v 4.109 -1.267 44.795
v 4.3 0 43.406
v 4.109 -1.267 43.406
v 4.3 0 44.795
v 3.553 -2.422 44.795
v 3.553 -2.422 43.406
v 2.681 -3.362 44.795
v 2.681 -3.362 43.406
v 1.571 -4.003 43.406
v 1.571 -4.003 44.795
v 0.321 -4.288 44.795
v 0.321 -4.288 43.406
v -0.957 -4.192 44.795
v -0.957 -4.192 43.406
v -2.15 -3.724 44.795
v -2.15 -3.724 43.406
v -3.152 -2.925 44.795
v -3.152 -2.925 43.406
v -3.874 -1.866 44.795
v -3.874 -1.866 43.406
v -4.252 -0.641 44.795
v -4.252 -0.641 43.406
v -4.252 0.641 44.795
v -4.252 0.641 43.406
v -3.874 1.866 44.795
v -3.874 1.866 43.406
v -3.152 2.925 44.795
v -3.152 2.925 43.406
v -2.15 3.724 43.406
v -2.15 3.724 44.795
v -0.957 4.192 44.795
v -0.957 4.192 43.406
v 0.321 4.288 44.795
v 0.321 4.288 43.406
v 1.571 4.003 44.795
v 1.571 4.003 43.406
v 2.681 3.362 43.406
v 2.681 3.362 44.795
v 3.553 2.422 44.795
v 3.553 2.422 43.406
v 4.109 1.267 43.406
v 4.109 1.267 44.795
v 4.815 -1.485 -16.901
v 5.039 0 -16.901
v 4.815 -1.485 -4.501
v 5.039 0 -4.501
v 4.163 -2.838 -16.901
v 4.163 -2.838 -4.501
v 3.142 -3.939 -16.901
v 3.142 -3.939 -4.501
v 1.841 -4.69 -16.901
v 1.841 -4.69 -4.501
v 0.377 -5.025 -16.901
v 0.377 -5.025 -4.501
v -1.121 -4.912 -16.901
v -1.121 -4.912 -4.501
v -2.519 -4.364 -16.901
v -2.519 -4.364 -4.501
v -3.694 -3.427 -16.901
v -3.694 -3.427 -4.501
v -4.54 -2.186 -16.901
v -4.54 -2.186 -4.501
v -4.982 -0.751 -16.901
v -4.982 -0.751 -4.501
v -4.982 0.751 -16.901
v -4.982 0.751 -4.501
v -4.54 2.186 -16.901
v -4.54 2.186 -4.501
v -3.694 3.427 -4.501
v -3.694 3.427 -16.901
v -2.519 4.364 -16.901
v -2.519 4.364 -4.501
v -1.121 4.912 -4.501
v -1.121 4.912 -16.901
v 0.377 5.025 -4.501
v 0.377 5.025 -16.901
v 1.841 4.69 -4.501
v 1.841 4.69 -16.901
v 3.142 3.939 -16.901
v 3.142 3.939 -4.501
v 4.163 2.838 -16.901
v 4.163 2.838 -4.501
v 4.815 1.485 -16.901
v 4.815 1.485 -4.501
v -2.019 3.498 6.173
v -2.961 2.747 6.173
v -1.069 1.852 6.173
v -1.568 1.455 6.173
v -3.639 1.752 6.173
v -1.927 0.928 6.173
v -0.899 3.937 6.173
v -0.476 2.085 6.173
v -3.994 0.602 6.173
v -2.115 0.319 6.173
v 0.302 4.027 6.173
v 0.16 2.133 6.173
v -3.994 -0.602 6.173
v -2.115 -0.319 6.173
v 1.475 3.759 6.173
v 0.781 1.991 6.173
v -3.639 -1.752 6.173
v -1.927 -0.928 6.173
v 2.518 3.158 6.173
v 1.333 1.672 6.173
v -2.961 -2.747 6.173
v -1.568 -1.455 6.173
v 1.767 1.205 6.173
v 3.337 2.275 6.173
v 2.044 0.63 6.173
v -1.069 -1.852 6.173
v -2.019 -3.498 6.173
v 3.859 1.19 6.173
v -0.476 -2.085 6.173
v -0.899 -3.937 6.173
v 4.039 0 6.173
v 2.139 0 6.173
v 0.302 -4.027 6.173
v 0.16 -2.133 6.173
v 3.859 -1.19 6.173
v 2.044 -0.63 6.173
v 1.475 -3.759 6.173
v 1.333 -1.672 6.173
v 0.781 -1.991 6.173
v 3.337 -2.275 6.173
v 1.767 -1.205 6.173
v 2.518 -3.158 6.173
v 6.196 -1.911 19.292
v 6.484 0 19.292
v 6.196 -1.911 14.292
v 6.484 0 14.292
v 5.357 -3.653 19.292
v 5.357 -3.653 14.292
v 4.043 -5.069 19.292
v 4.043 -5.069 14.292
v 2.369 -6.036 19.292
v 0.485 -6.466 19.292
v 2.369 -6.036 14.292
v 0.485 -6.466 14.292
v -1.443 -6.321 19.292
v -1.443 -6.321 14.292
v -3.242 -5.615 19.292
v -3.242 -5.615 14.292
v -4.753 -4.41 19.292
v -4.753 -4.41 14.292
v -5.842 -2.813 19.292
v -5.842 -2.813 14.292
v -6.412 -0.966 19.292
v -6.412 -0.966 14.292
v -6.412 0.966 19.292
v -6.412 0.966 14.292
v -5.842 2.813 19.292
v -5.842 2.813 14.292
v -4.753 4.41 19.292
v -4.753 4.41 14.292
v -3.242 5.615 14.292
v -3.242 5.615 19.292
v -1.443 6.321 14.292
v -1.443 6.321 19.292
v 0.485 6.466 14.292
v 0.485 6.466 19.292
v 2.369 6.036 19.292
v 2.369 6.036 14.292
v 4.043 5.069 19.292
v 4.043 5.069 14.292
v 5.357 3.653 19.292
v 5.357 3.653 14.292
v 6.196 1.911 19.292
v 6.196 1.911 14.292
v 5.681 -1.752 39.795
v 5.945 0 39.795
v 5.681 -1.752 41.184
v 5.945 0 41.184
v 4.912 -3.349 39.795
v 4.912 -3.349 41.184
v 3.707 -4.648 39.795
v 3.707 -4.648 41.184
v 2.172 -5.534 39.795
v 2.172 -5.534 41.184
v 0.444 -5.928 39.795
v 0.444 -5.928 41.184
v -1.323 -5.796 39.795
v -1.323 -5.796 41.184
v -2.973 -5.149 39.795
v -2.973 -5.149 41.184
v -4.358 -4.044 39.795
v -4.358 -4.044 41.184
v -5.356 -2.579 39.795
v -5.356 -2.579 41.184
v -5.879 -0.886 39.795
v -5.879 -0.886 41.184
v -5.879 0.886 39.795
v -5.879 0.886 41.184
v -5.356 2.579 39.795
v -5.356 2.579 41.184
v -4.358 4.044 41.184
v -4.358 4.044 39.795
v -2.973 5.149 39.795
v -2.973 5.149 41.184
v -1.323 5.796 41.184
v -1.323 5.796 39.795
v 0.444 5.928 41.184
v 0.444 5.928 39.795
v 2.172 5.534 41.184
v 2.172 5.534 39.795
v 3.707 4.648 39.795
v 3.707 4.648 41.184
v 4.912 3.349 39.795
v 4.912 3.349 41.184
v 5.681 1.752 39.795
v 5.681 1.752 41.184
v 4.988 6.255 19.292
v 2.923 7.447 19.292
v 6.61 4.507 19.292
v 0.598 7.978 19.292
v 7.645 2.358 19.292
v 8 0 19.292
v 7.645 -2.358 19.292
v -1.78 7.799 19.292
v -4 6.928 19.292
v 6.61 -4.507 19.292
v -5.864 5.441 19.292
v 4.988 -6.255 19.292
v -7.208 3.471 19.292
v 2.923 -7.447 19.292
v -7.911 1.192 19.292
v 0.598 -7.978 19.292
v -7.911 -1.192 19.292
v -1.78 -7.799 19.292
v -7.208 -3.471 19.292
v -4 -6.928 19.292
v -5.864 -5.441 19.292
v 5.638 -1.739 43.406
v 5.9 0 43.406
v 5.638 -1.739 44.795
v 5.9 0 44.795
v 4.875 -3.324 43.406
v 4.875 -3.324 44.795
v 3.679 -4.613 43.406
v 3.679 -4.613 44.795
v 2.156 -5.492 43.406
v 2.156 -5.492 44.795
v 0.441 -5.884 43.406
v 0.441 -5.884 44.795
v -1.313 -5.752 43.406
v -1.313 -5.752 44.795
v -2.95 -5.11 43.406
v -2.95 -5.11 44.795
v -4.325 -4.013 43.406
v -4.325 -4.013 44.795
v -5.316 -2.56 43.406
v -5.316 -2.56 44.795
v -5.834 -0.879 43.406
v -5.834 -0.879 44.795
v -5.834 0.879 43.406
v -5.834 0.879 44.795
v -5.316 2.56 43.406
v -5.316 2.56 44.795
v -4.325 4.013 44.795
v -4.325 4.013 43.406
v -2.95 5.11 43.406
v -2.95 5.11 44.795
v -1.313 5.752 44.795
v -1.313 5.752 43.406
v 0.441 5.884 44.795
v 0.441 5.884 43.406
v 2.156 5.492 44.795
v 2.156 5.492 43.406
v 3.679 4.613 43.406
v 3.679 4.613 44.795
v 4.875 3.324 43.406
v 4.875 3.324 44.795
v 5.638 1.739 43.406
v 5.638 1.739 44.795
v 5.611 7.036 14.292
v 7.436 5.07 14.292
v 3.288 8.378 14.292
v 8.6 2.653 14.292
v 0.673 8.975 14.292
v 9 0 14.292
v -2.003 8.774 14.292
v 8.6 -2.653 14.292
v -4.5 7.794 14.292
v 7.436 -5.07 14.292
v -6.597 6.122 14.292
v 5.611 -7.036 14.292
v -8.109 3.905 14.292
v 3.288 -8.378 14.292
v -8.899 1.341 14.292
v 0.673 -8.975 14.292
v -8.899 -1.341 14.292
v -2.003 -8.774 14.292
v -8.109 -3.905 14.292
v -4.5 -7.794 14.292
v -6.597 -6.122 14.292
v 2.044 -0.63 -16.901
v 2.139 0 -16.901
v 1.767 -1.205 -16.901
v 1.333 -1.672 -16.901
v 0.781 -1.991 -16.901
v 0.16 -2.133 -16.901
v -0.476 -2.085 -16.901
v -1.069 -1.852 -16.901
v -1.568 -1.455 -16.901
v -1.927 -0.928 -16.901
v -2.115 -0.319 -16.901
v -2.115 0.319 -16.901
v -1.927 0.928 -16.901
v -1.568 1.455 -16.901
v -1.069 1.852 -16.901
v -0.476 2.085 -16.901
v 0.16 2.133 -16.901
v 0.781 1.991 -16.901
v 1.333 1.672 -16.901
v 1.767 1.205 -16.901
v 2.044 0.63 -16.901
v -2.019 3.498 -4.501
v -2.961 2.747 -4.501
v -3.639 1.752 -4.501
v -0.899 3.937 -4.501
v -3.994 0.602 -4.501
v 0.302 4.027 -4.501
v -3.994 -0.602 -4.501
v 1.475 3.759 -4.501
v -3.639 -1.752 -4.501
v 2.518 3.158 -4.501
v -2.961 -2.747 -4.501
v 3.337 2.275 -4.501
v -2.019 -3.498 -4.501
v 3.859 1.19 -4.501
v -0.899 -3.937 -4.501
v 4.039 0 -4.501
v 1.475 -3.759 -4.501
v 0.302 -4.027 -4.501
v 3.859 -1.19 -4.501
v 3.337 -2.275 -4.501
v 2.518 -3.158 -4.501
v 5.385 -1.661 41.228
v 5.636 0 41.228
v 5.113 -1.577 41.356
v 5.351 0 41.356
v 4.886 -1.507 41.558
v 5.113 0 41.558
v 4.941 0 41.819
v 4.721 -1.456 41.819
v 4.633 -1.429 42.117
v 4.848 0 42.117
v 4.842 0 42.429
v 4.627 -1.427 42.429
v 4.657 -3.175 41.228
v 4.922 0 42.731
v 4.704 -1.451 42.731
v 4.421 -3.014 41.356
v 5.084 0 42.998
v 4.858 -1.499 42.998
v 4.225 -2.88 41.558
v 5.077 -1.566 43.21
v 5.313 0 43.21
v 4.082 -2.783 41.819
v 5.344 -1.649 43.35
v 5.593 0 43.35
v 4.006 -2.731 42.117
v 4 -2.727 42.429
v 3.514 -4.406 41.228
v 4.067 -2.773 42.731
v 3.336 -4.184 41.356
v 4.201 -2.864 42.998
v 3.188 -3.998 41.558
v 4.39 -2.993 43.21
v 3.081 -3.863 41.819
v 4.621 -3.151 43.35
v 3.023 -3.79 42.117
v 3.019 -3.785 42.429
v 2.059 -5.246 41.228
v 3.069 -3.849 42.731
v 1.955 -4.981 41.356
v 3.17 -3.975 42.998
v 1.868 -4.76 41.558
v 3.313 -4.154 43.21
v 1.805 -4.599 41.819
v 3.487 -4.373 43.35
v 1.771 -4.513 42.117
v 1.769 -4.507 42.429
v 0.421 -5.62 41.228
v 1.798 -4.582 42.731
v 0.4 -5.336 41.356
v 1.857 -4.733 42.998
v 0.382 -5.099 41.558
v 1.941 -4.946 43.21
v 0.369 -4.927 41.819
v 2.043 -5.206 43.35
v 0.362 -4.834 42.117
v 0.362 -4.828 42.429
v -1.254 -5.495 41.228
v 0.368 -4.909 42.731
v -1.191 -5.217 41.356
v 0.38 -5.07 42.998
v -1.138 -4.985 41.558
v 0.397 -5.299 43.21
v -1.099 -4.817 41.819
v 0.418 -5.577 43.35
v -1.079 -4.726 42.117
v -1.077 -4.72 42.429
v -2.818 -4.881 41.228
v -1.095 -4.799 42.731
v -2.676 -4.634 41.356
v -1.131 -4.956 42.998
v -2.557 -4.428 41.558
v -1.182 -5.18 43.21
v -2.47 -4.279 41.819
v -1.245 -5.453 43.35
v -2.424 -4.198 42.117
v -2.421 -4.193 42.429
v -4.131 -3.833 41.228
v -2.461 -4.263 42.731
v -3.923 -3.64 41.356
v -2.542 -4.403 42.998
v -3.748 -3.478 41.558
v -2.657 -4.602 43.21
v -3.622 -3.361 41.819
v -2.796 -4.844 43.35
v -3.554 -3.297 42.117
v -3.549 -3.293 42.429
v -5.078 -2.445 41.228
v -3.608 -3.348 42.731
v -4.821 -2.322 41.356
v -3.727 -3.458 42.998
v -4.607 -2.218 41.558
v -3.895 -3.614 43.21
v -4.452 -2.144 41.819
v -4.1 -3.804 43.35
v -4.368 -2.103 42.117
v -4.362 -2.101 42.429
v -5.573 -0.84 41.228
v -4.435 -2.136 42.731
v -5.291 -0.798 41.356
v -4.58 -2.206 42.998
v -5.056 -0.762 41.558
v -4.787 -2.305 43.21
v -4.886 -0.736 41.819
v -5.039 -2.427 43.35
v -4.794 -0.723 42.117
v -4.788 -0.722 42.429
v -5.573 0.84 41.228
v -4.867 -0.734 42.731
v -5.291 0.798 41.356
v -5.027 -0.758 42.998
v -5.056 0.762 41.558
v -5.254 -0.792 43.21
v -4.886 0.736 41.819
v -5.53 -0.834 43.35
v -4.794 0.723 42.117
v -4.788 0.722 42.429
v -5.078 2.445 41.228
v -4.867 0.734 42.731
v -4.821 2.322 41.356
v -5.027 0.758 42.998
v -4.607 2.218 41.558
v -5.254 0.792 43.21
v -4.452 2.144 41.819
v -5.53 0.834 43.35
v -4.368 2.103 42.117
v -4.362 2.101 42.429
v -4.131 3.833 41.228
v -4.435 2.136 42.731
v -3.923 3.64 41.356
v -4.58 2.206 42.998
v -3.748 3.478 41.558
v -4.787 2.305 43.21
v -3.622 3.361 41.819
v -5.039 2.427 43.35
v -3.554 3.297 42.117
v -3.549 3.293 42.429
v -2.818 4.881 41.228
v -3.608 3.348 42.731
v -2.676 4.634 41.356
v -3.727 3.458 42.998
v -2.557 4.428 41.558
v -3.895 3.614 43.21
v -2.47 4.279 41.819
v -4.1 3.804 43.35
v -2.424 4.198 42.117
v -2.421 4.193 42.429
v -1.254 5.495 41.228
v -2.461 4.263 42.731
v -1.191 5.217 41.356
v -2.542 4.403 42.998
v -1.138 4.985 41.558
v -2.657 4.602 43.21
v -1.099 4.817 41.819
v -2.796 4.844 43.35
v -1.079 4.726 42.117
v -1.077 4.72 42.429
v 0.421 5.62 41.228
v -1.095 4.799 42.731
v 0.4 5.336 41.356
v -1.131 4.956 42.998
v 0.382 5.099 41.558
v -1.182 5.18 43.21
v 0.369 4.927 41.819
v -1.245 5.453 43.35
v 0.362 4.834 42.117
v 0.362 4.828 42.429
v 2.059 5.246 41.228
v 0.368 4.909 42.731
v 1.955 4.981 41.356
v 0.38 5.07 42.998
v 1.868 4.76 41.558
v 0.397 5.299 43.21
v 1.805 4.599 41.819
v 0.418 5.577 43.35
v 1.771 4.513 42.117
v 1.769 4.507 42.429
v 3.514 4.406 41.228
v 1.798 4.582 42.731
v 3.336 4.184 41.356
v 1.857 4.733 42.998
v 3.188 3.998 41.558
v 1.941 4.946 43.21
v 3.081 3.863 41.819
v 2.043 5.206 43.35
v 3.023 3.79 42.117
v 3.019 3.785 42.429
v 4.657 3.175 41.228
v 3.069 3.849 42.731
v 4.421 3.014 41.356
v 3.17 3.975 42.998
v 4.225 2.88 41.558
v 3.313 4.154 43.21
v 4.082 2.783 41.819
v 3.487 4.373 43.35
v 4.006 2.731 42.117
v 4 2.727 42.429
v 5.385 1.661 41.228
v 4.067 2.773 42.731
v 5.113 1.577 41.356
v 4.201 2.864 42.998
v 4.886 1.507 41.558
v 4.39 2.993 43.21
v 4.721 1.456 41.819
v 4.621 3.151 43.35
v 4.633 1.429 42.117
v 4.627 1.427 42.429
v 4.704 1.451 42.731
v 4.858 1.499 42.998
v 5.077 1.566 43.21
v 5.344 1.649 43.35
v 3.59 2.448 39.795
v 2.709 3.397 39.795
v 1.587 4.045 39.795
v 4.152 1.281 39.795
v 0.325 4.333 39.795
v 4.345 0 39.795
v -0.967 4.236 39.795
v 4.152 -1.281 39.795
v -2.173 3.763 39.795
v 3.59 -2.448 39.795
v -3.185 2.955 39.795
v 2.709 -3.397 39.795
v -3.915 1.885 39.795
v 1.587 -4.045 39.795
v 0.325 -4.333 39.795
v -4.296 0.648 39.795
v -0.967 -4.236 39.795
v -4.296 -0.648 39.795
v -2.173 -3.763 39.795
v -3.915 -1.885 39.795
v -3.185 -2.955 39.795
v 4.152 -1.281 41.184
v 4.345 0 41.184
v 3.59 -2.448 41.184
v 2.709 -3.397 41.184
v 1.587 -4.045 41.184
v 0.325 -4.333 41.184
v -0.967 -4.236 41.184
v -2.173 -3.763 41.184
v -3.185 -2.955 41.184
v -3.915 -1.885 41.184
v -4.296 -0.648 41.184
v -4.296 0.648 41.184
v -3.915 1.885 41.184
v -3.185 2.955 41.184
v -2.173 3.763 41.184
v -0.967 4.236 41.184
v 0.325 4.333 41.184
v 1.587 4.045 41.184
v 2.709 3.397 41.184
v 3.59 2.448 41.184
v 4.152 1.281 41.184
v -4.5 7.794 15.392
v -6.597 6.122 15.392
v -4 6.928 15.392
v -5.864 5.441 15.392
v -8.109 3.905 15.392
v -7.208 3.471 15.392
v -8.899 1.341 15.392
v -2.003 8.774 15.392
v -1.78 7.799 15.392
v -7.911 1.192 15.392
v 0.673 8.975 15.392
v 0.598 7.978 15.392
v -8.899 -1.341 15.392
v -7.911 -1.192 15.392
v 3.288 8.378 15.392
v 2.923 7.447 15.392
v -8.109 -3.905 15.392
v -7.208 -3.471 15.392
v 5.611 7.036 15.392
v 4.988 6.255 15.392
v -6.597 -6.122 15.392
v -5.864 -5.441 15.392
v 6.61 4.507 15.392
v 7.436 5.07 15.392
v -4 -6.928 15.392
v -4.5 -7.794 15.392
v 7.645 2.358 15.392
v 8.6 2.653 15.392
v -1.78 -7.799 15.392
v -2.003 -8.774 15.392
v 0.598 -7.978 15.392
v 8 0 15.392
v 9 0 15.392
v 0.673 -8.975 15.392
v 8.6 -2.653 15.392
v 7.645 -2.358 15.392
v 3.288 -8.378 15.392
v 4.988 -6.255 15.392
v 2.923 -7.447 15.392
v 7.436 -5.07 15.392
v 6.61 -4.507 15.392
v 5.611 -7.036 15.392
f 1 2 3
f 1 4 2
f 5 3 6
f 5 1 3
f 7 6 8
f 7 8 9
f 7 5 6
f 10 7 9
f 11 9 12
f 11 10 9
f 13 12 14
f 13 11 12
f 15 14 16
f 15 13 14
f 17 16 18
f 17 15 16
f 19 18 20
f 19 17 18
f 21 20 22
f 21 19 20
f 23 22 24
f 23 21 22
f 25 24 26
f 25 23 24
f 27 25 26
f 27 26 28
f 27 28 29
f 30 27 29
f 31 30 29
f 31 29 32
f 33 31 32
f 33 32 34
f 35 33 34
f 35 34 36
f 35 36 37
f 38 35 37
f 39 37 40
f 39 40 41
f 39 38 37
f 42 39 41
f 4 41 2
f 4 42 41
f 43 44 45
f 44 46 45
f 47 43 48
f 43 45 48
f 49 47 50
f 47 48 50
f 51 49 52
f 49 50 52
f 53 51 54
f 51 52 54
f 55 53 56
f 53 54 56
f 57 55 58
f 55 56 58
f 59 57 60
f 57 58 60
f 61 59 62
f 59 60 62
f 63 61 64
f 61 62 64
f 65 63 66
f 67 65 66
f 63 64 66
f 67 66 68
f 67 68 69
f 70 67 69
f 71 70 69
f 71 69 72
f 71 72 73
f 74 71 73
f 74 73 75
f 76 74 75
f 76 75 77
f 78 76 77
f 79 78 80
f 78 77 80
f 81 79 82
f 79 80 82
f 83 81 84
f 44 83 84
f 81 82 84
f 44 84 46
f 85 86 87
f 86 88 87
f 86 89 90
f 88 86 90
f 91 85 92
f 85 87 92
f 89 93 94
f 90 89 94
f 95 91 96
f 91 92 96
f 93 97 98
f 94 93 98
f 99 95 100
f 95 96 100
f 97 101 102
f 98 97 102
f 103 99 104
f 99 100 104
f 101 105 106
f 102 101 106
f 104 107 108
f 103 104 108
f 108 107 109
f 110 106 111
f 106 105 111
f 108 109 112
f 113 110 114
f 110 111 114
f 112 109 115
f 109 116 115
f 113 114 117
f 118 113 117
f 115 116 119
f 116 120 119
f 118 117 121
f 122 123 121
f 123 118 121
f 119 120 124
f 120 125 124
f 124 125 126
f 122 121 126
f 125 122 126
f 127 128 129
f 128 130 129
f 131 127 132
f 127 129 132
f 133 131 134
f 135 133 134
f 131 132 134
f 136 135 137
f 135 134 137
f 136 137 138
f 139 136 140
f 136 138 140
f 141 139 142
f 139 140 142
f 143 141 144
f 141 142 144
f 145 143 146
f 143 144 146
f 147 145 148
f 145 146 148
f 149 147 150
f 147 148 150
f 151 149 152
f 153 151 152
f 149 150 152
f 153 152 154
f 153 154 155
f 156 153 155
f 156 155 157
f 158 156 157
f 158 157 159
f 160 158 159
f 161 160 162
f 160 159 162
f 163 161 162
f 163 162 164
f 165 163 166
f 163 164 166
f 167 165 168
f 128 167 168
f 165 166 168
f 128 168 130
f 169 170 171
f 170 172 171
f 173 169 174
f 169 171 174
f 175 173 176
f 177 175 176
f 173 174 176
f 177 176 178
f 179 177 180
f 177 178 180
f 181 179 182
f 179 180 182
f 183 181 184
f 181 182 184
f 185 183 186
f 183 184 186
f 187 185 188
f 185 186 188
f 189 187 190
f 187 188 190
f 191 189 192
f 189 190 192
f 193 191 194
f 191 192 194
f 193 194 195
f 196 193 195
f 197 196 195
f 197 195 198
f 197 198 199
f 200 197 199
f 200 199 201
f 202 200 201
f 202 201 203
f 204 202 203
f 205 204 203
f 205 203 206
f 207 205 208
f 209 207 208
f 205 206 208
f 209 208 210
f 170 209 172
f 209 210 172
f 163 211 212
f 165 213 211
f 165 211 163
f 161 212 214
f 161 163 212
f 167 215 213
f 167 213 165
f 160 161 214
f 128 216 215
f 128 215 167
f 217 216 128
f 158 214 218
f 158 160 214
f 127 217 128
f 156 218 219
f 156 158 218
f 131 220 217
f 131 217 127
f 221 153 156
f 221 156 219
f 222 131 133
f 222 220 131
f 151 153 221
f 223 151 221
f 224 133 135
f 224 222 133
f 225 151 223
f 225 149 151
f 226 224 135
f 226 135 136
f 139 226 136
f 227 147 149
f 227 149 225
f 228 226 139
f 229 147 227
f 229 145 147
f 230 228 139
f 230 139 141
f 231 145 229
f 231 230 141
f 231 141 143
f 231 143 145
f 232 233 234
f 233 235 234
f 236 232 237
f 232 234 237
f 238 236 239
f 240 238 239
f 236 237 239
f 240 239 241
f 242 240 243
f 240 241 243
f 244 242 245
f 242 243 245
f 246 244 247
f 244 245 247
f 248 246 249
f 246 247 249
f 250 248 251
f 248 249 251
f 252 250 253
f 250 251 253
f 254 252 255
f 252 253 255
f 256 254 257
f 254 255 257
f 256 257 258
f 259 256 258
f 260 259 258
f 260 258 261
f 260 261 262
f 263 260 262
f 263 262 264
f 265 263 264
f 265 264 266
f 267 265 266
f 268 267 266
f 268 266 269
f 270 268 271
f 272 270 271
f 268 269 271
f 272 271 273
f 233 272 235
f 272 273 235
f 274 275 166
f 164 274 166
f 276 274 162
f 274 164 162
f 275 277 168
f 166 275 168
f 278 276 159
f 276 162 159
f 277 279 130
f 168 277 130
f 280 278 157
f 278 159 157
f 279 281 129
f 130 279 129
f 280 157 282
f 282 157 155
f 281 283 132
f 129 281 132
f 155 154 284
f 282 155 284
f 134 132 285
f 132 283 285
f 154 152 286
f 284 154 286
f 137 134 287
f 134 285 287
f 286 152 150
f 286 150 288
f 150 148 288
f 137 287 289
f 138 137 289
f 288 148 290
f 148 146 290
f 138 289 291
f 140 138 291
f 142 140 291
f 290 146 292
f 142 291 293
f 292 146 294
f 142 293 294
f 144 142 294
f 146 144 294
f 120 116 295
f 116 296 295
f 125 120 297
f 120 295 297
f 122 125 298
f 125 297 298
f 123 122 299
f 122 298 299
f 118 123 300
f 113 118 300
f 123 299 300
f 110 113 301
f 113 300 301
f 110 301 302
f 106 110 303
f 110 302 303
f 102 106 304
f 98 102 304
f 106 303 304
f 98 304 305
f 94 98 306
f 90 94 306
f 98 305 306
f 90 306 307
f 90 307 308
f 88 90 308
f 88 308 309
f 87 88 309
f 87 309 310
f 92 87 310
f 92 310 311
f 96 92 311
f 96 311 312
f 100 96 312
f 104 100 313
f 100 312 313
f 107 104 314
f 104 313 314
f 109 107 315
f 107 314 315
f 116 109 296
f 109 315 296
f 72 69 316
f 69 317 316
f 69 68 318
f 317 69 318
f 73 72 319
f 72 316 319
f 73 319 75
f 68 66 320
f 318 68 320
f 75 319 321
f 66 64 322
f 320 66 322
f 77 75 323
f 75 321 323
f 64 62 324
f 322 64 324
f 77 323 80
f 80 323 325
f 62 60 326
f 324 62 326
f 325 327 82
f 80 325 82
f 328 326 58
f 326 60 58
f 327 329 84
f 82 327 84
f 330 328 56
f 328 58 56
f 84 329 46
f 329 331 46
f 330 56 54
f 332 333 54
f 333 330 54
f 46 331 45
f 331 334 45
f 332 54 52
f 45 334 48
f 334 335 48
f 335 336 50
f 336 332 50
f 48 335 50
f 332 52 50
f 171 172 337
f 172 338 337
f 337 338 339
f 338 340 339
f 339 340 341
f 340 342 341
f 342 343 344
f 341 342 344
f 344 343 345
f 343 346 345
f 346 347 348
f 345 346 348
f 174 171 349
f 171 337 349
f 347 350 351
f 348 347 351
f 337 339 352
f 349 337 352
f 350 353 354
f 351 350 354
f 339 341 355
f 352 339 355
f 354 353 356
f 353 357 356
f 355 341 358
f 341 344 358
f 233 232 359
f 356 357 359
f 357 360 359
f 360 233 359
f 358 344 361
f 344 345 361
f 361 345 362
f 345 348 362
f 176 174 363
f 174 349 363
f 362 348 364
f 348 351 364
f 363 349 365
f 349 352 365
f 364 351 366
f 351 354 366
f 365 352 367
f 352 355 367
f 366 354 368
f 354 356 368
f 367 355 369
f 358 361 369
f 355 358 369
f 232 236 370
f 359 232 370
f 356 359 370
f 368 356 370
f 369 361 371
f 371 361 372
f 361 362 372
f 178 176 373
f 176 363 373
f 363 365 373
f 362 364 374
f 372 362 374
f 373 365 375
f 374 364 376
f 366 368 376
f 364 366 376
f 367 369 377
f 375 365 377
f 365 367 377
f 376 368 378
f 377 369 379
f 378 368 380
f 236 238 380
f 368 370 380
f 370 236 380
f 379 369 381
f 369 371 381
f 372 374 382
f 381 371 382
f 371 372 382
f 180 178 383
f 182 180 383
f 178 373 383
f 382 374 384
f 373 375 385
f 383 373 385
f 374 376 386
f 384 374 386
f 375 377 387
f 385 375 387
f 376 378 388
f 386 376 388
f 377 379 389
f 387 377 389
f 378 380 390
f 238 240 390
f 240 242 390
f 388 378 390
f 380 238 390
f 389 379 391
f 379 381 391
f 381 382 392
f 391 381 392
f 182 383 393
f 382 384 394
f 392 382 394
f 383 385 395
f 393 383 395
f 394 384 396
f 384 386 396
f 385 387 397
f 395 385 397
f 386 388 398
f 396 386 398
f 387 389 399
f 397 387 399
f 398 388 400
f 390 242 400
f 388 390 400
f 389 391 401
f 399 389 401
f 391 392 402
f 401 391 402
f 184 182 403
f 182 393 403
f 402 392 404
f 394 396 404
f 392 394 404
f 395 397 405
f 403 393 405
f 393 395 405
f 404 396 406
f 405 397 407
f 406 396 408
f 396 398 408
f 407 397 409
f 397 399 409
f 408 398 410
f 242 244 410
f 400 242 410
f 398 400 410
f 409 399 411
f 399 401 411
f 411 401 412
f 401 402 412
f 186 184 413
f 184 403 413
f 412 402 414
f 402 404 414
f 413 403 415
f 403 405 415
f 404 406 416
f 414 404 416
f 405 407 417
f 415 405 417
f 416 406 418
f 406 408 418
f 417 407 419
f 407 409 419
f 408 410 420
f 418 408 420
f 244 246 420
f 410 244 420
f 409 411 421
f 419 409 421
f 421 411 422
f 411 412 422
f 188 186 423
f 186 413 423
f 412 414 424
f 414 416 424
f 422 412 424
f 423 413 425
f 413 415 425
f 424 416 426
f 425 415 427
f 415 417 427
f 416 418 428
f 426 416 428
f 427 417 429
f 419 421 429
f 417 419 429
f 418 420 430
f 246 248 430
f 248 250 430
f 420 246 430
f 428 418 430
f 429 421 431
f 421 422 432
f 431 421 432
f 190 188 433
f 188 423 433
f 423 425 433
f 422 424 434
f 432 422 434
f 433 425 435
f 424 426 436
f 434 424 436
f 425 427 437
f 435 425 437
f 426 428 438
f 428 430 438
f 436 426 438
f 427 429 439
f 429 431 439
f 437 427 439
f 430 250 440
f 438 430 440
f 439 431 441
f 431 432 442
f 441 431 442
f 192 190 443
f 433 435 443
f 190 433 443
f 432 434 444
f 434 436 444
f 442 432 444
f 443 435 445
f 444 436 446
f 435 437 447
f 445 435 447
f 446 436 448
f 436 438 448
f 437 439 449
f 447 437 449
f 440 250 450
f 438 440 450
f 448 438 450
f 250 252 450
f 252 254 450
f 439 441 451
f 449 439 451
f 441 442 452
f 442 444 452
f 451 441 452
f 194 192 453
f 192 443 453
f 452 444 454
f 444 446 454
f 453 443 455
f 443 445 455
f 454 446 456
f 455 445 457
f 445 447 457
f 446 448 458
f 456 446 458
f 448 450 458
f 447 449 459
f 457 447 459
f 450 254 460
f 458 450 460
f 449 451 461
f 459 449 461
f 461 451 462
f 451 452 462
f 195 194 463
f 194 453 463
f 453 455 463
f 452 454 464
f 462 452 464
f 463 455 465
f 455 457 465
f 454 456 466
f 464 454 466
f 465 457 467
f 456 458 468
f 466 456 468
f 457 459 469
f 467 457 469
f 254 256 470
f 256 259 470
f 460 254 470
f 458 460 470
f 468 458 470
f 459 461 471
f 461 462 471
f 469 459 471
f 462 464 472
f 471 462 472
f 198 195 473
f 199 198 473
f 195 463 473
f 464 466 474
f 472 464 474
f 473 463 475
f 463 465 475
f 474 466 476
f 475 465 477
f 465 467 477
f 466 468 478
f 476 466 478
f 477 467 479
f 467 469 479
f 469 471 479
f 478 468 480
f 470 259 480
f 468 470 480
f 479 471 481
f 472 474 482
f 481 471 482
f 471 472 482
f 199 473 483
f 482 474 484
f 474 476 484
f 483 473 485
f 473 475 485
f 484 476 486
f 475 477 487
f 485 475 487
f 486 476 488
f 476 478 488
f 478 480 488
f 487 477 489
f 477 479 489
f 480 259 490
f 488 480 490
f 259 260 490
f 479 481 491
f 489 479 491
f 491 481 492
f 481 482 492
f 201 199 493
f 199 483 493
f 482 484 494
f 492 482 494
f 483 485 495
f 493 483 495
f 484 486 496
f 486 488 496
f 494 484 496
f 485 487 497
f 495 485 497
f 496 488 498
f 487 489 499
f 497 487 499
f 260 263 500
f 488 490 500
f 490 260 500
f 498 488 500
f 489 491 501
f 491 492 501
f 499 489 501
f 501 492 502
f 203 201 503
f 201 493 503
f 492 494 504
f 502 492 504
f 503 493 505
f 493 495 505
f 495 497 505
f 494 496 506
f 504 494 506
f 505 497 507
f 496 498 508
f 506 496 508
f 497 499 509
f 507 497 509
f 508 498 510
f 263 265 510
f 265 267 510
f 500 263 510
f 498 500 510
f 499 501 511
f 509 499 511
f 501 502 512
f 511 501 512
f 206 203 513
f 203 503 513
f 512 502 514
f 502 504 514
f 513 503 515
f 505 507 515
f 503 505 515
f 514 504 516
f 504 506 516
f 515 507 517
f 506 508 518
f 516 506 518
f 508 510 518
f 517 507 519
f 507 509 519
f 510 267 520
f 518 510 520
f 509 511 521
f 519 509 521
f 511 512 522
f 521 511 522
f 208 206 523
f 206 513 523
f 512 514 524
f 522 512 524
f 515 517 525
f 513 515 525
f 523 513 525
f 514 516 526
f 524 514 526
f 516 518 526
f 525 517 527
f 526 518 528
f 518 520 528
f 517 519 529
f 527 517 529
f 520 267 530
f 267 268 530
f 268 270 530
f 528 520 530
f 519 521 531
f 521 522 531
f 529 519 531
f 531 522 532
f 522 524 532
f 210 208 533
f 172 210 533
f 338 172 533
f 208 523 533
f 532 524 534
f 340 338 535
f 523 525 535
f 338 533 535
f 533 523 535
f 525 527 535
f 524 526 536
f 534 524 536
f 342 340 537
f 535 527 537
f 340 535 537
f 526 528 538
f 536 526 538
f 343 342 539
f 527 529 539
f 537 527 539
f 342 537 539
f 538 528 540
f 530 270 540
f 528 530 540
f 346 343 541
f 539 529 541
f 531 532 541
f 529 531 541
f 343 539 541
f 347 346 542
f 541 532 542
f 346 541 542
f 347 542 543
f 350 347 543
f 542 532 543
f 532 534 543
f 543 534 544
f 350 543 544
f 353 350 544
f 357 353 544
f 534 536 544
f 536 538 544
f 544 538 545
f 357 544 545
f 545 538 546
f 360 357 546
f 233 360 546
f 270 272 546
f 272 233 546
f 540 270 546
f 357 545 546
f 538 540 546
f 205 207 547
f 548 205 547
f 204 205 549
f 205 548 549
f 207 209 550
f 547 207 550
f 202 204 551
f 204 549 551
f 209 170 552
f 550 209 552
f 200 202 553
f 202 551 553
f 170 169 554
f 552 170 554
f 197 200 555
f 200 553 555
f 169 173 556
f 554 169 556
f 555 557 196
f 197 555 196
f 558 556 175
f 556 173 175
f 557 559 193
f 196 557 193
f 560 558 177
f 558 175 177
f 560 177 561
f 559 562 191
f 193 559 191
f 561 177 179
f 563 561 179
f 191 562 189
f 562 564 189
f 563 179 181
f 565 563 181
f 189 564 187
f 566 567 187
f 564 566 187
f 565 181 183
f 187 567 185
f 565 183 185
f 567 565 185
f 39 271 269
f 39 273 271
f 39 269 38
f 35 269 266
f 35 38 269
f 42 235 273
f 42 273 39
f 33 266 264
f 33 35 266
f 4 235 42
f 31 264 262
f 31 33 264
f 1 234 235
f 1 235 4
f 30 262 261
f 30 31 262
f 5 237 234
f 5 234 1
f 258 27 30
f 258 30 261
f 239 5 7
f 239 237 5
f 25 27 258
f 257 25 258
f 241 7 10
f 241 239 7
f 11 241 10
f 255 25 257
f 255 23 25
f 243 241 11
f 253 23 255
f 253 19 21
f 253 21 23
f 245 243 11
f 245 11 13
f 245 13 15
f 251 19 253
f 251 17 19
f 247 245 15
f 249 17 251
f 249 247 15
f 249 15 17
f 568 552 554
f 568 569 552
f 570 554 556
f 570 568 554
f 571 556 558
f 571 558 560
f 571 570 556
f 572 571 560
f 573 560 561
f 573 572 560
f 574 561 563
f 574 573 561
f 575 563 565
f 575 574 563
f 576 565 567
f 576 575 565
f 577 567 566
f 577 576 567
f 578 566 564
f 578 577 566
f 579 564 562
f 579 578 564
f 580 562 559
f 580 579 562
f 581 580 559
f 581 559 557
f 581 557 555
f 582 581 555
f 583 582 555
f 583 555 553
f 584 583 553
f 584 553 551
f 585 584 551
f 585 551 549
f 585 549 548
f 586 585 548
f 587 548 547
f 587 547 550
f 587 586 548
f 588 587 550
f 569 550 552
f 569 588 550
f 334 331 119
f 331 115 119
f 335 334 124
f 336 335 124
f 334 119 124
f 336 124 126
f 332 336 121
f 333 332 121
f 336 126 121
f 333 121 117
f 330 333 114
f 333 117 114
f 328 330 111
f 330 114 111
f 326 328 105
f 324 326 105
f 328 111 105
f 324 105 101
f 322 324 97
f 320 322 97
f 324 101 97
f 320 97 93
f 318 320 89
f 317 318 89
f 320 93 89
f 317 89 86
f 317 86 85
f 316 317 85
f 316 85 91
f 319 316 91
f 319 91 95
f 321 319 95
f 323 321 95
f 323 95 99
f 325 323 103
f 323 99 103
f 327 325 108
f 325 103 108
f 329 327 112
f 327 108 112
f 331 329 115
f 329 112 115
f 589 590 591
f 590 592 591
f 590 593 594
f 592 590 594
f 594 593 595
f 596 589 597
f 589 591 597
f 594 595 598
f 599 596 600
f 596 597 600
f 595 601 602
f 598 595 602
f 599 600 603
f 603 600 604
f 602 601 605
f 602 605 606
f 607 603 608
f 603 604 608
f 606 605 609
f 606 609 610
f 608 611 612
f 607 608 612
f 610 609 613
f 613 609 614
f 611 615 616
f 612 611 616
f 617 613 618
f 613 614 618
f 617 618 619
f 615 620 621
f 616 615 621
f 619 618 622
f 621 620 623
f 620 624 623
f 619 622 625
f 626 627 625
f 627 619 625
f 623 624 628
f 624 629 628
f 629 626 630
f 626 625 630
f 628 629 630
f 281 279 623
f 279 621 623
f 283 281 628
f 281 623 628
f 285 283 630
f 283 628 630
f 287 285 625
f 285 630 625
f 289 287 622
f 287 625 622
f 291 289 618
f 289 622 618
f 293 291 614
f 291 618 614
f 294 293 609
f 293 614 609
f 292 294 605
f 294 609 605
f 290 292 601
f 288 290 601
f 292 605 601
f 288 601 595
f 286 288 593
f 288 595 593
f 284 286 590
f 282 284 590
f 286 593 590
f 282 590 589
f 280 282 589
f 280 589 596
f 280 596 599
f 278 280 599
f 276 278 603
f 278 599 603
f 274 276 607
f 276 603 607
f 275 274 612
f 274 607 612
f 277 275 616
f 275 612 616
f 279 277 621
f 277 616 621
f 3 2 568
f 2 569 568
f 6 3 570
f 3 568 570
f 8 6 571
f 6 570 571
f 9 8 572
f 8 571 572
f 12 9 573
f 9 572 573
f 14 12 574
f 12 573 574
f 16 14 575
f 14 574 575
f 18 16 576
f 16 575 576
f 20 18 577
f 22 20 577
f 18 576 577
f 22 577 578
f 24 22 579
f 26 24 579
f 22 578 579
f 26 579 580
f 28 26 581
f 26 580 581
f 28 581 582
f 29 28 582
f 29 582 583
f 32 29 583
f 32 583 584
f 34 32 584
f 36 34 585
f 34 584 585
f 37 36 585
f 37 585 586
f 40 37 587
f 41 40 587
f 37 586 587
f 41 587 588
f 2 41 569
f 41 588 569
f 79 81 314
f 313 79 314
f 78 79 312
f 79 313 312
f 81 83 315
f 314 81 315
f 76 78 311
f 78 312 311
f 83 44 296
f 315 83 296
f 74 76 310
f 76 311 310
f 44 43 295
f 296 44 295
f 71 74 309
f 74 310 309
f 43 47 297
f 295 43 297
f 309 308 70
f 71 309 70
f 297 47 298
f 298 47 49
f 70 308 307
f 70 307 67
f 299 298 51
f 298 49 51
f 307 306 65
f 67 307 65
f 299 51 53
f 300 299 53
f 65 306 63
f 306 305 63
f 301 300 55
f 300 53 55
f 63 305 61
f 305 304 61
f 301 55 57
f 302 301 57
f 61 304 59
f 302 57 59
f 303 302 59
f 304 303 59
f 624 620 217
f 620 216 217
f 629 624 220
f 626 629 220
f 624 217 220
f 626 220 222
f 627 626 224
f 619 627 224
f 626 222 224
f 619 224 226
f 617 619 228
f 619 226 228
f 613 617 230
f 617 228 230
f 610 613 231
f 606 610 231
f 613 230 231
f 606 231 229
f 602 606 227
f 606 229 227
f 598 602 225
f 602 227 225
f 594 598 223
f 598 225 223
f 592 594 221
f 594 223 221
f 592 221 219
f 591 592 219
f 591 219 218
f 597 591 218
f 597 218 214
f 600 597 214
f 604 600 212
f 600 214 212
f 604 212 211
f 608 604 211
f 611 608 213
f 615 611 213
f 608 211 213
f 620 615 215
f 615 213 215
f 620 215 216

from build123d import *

# Parameters (mm, degrees)
F0_W   = 1.516
F0_H   = 3.9
F0_W_2 = 1.6
F0_H_2 = 1.389


with BuildPart() as f1:
    # F0 (on Front) → F1 (revolve)
    with BuildSketch(Plane.XZ):
        with Locations((7.242, 17.34189)):
            Rectangle(F0_W, F0_H)
        Polygon((9, 15.39189), (8, 15.39189), (6.484, 15.39189), (6.484, 14.29189), (9, 14.29189), align=None)
        Polygon((4.038654, 6.173161), (2.138654, 6.173161), (2.138654, -16.900839), (5.038654, -16.900839), (5.038654, -4.500839), (4.038654, -4.500839), align=None)
        with Locations((5.1, 44.10054)):
            Rectangle(F0_W_2, F0_H_2)
        with BuildLine():
            Line((5.9, 43.40604), (4.3, 43.40604))
            Line((4.3, 43.40604), (4.345011, 41.18404))
            Line((4.345011, 41.18404), (5.945011, 41.18404))
            ThreePointArc((5.945011, 41.18404), (4.833783, 42.272986), (5.9, 43.40604))
        make_face()
        with Locations((5.145011, 40.48954)):
            Rectangle(F0_W_2, F0_H_2)
    revolve(axis=Axis((0, 0, 5.041287), (0, 0, -1)))


solid = f1.part
